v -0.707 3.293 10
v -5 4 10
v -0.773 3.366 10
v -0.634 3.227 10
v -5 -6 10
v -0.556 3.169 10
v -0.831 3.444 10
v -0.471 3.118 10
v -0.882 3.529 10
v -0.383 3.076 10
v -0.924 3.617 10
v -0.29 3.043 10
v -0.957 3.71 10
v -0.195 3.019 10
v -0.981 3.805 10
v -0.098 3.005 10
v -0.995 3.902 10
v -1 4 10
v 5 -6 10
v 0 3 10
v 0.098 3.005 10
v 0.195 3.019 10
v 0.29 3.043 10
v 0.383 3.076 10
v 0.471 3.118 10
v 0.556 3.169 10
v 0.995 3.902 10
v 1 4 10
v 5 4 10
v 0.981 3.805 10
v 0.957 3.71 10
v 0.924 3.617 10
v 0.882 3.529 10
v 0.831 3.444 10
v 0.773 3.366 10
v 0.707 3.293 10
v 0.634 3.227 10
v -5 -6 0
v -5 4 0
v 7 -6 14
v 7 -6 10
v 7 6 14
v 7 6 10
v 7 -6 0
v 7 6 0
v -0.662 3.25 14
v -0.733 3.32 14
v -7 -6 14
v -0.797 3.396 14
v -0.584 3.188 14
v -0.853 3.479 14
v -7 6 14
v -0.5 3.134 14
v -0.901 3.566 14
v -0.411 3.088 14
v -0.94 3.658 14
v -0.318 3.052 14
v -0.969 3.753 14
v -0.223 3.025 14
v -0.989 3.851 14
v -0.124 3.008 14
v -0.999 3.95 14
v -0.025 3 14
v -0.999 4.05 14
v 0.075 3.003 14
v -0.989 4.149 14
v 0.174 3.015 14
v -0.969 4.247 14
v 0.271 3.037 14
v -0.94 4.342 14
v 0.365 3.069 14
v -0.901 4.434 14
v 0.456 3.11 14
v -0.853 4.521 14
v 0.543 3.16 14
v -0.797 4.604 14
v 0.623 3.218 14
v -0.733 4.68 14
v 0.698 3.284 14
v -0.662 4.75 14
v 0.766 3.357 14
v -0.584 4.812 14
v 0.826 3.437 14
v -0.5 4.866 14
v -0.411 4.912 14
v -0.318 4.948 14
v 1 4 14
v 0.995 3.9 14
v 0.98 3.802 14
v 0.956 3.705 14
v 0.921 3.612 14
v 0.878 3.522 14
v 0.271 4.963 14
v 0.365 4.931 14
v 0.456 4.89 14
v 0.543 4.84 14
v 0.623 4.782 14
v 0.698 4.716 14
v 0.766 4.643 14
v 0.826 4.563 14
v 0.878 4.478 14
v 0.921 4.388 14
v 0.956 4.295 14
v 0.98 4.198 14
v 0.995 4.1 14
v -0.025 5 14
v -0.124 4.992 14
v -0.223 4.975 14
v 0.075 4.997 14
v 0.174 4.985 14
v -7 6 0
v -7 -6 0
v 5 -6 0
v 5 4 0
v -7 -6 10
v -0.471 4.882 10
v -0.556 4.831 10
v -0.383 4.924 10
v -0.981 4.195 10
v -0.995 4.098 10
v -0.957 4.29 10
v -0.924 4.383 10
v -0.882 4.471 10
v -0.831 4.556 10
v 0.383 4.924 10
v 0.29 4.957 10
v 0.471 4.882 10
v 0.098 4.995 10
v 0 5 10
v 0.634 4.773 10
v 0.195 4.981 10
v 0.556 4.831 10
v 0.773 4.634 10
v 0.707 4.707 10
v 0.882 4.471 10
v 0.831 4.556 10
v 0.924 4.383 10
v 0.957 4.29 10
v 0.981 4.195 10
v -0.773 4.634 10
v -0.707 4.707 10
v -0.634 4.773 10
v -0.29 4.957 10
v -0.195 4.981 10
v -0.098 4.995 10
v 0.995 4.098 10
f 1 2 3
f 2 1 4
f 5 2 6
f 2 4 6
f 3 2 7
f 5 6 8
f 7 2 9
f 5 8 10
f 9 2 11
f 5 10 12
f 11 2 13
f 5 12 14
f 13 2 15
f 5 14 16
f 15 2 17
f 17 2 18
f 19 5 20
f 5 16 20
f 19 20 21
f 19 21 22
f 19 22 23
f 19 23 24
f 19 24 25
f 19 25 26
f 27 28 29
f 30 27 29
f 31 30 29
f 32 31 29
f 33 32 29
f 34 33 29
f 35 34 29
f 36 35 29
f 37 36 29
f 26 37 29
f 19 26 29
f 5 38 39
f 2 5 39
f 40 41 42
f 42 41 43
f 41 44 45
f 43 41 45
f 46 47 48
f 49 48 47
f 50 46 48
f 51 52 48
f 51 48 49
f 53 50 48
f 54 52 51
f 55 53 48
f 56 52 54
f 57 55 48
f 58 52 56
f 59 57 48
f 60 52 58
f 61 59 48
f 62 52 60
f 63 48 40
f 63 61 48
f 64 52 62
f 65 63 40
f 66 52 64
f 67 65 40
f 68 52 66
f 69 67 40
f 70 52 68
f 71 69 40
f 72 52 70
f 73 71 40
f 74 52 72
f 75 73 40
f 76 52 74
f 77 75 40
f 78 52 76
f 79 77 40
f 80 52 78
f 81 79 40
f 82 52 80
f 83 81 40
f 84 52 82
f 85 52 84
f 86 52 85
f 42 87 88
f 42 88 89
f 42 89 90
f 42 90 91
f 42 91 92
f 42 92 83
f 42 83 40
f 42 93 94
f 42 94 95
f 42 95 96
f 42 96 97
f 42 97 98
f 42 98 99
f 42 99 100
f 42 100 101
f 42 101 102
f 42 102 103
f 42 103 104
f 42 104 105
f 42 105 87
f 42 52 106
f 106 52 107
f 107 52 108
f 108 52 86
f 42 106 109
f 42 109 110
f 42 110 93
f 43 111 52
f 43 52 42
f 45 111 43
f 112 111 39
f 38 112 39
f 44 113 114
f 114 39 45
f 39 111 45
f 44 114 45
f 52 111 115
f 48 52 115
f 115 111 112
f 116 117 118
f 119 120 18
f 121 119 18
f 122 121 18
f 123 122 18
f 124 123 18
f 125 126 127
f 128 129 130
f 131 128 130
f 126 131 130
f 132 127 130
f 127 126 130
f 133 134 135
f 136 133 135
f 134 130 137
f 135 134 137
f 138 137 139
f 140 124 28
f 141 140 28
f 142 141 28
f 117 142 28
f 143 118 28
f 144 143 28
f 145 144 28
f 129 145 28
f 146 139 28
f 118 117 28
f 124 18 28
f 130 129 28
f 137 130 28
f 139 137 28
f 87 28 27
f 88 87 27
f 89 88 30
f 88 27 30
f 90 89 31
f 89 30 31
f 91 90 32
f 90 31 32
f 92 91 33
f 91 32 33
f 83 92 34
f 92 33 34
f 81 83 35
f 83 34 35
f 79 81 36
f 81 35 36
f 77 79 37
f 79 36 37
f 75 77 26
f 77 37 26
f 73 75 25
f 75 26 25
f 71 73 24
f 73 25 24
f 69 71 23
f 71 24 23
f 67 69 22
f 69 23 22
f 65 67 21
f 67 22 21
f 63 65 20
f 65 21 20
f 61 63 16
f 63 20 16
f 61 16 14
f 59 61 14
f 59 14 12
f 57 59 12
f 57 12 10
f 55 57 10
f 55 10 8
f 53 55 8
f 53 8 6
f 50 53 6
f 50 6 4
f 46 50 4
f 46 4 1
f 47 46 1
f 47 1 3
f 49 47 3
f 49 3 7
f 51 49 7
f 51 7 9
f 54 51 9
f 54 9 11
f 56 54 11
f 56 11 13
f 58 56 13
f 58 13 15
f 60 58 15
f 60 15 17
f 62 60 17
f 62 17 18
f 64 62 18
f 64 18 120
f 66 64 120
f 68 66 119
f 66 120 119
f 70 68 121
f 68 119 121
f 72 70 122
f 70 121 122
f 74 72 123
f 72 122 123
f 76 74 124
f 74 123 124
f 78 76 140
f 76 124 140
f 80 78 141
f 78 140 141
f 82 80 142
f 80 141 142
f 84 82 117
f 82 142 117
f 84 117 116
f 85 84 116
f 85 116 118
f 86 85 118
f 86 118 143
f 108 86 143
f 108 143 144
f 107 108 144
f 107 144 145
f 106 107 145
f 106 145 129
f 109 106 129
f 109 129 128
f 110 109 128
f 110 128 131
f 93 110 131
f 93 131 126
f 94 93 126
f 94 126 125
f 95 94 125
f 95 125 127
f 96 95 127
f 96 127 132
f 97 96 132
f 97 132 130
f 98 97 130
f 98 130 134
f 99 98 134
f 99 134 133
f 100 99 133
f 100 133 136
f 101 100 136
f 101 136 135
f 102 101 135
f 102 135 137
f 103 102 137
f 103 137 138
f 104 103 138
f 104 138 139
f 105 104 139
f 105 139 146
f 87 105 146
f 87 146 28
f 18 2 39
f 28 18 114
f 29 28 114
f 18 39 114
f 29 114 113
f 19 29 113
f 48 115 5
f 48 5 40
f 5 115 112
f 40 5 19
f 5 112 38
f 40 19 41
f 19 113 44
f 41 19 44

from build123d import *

# Parameters (mm, degrees)
F1_DEPTH = 10
F2_W     = 14
F2_H     = 4.2422189787
F2_H_2   = 7.7577810213
F3_DEPTH = 4
F4_D     = 2
F4_DEPTH = 4.001


with BuildPart() as f1:
    # F0 (on Top) → F1 (new body)
    with BuildSketch(Plane.XY):
        Polygon((7, 6), (-7, 6), (-7, -6), (-5, -6), (-5, 4), (5, 4), (5, -6), (7, -6), align=None)
    extrude(amount=F1_DEPTH)

    # F2 (on face) → F3 (join)
    with BuildSketch(Plane.XY.offset(10)):
        with Locations((0, 3.8788905106)):
            Rectangle(F2_W, F2_H)
        with Locations((0, -2.1211094894)):
            Rectangle(F2_W, F2_H_2)
    extrude(amount=F3_DEPTH)

    # F4 (through all, one way)
    with BuildSketch(Plane(origin=(0, 0, 10), x_dir=(1, 0, 0), z_dir=(0, 0, -1))):
        with Locations((0, -4)):
            Circle(F4_D / 2)
    extrude(amount=-F4_DEPTH, mode=Mode.SUBTRACT)


solid = f1.part
